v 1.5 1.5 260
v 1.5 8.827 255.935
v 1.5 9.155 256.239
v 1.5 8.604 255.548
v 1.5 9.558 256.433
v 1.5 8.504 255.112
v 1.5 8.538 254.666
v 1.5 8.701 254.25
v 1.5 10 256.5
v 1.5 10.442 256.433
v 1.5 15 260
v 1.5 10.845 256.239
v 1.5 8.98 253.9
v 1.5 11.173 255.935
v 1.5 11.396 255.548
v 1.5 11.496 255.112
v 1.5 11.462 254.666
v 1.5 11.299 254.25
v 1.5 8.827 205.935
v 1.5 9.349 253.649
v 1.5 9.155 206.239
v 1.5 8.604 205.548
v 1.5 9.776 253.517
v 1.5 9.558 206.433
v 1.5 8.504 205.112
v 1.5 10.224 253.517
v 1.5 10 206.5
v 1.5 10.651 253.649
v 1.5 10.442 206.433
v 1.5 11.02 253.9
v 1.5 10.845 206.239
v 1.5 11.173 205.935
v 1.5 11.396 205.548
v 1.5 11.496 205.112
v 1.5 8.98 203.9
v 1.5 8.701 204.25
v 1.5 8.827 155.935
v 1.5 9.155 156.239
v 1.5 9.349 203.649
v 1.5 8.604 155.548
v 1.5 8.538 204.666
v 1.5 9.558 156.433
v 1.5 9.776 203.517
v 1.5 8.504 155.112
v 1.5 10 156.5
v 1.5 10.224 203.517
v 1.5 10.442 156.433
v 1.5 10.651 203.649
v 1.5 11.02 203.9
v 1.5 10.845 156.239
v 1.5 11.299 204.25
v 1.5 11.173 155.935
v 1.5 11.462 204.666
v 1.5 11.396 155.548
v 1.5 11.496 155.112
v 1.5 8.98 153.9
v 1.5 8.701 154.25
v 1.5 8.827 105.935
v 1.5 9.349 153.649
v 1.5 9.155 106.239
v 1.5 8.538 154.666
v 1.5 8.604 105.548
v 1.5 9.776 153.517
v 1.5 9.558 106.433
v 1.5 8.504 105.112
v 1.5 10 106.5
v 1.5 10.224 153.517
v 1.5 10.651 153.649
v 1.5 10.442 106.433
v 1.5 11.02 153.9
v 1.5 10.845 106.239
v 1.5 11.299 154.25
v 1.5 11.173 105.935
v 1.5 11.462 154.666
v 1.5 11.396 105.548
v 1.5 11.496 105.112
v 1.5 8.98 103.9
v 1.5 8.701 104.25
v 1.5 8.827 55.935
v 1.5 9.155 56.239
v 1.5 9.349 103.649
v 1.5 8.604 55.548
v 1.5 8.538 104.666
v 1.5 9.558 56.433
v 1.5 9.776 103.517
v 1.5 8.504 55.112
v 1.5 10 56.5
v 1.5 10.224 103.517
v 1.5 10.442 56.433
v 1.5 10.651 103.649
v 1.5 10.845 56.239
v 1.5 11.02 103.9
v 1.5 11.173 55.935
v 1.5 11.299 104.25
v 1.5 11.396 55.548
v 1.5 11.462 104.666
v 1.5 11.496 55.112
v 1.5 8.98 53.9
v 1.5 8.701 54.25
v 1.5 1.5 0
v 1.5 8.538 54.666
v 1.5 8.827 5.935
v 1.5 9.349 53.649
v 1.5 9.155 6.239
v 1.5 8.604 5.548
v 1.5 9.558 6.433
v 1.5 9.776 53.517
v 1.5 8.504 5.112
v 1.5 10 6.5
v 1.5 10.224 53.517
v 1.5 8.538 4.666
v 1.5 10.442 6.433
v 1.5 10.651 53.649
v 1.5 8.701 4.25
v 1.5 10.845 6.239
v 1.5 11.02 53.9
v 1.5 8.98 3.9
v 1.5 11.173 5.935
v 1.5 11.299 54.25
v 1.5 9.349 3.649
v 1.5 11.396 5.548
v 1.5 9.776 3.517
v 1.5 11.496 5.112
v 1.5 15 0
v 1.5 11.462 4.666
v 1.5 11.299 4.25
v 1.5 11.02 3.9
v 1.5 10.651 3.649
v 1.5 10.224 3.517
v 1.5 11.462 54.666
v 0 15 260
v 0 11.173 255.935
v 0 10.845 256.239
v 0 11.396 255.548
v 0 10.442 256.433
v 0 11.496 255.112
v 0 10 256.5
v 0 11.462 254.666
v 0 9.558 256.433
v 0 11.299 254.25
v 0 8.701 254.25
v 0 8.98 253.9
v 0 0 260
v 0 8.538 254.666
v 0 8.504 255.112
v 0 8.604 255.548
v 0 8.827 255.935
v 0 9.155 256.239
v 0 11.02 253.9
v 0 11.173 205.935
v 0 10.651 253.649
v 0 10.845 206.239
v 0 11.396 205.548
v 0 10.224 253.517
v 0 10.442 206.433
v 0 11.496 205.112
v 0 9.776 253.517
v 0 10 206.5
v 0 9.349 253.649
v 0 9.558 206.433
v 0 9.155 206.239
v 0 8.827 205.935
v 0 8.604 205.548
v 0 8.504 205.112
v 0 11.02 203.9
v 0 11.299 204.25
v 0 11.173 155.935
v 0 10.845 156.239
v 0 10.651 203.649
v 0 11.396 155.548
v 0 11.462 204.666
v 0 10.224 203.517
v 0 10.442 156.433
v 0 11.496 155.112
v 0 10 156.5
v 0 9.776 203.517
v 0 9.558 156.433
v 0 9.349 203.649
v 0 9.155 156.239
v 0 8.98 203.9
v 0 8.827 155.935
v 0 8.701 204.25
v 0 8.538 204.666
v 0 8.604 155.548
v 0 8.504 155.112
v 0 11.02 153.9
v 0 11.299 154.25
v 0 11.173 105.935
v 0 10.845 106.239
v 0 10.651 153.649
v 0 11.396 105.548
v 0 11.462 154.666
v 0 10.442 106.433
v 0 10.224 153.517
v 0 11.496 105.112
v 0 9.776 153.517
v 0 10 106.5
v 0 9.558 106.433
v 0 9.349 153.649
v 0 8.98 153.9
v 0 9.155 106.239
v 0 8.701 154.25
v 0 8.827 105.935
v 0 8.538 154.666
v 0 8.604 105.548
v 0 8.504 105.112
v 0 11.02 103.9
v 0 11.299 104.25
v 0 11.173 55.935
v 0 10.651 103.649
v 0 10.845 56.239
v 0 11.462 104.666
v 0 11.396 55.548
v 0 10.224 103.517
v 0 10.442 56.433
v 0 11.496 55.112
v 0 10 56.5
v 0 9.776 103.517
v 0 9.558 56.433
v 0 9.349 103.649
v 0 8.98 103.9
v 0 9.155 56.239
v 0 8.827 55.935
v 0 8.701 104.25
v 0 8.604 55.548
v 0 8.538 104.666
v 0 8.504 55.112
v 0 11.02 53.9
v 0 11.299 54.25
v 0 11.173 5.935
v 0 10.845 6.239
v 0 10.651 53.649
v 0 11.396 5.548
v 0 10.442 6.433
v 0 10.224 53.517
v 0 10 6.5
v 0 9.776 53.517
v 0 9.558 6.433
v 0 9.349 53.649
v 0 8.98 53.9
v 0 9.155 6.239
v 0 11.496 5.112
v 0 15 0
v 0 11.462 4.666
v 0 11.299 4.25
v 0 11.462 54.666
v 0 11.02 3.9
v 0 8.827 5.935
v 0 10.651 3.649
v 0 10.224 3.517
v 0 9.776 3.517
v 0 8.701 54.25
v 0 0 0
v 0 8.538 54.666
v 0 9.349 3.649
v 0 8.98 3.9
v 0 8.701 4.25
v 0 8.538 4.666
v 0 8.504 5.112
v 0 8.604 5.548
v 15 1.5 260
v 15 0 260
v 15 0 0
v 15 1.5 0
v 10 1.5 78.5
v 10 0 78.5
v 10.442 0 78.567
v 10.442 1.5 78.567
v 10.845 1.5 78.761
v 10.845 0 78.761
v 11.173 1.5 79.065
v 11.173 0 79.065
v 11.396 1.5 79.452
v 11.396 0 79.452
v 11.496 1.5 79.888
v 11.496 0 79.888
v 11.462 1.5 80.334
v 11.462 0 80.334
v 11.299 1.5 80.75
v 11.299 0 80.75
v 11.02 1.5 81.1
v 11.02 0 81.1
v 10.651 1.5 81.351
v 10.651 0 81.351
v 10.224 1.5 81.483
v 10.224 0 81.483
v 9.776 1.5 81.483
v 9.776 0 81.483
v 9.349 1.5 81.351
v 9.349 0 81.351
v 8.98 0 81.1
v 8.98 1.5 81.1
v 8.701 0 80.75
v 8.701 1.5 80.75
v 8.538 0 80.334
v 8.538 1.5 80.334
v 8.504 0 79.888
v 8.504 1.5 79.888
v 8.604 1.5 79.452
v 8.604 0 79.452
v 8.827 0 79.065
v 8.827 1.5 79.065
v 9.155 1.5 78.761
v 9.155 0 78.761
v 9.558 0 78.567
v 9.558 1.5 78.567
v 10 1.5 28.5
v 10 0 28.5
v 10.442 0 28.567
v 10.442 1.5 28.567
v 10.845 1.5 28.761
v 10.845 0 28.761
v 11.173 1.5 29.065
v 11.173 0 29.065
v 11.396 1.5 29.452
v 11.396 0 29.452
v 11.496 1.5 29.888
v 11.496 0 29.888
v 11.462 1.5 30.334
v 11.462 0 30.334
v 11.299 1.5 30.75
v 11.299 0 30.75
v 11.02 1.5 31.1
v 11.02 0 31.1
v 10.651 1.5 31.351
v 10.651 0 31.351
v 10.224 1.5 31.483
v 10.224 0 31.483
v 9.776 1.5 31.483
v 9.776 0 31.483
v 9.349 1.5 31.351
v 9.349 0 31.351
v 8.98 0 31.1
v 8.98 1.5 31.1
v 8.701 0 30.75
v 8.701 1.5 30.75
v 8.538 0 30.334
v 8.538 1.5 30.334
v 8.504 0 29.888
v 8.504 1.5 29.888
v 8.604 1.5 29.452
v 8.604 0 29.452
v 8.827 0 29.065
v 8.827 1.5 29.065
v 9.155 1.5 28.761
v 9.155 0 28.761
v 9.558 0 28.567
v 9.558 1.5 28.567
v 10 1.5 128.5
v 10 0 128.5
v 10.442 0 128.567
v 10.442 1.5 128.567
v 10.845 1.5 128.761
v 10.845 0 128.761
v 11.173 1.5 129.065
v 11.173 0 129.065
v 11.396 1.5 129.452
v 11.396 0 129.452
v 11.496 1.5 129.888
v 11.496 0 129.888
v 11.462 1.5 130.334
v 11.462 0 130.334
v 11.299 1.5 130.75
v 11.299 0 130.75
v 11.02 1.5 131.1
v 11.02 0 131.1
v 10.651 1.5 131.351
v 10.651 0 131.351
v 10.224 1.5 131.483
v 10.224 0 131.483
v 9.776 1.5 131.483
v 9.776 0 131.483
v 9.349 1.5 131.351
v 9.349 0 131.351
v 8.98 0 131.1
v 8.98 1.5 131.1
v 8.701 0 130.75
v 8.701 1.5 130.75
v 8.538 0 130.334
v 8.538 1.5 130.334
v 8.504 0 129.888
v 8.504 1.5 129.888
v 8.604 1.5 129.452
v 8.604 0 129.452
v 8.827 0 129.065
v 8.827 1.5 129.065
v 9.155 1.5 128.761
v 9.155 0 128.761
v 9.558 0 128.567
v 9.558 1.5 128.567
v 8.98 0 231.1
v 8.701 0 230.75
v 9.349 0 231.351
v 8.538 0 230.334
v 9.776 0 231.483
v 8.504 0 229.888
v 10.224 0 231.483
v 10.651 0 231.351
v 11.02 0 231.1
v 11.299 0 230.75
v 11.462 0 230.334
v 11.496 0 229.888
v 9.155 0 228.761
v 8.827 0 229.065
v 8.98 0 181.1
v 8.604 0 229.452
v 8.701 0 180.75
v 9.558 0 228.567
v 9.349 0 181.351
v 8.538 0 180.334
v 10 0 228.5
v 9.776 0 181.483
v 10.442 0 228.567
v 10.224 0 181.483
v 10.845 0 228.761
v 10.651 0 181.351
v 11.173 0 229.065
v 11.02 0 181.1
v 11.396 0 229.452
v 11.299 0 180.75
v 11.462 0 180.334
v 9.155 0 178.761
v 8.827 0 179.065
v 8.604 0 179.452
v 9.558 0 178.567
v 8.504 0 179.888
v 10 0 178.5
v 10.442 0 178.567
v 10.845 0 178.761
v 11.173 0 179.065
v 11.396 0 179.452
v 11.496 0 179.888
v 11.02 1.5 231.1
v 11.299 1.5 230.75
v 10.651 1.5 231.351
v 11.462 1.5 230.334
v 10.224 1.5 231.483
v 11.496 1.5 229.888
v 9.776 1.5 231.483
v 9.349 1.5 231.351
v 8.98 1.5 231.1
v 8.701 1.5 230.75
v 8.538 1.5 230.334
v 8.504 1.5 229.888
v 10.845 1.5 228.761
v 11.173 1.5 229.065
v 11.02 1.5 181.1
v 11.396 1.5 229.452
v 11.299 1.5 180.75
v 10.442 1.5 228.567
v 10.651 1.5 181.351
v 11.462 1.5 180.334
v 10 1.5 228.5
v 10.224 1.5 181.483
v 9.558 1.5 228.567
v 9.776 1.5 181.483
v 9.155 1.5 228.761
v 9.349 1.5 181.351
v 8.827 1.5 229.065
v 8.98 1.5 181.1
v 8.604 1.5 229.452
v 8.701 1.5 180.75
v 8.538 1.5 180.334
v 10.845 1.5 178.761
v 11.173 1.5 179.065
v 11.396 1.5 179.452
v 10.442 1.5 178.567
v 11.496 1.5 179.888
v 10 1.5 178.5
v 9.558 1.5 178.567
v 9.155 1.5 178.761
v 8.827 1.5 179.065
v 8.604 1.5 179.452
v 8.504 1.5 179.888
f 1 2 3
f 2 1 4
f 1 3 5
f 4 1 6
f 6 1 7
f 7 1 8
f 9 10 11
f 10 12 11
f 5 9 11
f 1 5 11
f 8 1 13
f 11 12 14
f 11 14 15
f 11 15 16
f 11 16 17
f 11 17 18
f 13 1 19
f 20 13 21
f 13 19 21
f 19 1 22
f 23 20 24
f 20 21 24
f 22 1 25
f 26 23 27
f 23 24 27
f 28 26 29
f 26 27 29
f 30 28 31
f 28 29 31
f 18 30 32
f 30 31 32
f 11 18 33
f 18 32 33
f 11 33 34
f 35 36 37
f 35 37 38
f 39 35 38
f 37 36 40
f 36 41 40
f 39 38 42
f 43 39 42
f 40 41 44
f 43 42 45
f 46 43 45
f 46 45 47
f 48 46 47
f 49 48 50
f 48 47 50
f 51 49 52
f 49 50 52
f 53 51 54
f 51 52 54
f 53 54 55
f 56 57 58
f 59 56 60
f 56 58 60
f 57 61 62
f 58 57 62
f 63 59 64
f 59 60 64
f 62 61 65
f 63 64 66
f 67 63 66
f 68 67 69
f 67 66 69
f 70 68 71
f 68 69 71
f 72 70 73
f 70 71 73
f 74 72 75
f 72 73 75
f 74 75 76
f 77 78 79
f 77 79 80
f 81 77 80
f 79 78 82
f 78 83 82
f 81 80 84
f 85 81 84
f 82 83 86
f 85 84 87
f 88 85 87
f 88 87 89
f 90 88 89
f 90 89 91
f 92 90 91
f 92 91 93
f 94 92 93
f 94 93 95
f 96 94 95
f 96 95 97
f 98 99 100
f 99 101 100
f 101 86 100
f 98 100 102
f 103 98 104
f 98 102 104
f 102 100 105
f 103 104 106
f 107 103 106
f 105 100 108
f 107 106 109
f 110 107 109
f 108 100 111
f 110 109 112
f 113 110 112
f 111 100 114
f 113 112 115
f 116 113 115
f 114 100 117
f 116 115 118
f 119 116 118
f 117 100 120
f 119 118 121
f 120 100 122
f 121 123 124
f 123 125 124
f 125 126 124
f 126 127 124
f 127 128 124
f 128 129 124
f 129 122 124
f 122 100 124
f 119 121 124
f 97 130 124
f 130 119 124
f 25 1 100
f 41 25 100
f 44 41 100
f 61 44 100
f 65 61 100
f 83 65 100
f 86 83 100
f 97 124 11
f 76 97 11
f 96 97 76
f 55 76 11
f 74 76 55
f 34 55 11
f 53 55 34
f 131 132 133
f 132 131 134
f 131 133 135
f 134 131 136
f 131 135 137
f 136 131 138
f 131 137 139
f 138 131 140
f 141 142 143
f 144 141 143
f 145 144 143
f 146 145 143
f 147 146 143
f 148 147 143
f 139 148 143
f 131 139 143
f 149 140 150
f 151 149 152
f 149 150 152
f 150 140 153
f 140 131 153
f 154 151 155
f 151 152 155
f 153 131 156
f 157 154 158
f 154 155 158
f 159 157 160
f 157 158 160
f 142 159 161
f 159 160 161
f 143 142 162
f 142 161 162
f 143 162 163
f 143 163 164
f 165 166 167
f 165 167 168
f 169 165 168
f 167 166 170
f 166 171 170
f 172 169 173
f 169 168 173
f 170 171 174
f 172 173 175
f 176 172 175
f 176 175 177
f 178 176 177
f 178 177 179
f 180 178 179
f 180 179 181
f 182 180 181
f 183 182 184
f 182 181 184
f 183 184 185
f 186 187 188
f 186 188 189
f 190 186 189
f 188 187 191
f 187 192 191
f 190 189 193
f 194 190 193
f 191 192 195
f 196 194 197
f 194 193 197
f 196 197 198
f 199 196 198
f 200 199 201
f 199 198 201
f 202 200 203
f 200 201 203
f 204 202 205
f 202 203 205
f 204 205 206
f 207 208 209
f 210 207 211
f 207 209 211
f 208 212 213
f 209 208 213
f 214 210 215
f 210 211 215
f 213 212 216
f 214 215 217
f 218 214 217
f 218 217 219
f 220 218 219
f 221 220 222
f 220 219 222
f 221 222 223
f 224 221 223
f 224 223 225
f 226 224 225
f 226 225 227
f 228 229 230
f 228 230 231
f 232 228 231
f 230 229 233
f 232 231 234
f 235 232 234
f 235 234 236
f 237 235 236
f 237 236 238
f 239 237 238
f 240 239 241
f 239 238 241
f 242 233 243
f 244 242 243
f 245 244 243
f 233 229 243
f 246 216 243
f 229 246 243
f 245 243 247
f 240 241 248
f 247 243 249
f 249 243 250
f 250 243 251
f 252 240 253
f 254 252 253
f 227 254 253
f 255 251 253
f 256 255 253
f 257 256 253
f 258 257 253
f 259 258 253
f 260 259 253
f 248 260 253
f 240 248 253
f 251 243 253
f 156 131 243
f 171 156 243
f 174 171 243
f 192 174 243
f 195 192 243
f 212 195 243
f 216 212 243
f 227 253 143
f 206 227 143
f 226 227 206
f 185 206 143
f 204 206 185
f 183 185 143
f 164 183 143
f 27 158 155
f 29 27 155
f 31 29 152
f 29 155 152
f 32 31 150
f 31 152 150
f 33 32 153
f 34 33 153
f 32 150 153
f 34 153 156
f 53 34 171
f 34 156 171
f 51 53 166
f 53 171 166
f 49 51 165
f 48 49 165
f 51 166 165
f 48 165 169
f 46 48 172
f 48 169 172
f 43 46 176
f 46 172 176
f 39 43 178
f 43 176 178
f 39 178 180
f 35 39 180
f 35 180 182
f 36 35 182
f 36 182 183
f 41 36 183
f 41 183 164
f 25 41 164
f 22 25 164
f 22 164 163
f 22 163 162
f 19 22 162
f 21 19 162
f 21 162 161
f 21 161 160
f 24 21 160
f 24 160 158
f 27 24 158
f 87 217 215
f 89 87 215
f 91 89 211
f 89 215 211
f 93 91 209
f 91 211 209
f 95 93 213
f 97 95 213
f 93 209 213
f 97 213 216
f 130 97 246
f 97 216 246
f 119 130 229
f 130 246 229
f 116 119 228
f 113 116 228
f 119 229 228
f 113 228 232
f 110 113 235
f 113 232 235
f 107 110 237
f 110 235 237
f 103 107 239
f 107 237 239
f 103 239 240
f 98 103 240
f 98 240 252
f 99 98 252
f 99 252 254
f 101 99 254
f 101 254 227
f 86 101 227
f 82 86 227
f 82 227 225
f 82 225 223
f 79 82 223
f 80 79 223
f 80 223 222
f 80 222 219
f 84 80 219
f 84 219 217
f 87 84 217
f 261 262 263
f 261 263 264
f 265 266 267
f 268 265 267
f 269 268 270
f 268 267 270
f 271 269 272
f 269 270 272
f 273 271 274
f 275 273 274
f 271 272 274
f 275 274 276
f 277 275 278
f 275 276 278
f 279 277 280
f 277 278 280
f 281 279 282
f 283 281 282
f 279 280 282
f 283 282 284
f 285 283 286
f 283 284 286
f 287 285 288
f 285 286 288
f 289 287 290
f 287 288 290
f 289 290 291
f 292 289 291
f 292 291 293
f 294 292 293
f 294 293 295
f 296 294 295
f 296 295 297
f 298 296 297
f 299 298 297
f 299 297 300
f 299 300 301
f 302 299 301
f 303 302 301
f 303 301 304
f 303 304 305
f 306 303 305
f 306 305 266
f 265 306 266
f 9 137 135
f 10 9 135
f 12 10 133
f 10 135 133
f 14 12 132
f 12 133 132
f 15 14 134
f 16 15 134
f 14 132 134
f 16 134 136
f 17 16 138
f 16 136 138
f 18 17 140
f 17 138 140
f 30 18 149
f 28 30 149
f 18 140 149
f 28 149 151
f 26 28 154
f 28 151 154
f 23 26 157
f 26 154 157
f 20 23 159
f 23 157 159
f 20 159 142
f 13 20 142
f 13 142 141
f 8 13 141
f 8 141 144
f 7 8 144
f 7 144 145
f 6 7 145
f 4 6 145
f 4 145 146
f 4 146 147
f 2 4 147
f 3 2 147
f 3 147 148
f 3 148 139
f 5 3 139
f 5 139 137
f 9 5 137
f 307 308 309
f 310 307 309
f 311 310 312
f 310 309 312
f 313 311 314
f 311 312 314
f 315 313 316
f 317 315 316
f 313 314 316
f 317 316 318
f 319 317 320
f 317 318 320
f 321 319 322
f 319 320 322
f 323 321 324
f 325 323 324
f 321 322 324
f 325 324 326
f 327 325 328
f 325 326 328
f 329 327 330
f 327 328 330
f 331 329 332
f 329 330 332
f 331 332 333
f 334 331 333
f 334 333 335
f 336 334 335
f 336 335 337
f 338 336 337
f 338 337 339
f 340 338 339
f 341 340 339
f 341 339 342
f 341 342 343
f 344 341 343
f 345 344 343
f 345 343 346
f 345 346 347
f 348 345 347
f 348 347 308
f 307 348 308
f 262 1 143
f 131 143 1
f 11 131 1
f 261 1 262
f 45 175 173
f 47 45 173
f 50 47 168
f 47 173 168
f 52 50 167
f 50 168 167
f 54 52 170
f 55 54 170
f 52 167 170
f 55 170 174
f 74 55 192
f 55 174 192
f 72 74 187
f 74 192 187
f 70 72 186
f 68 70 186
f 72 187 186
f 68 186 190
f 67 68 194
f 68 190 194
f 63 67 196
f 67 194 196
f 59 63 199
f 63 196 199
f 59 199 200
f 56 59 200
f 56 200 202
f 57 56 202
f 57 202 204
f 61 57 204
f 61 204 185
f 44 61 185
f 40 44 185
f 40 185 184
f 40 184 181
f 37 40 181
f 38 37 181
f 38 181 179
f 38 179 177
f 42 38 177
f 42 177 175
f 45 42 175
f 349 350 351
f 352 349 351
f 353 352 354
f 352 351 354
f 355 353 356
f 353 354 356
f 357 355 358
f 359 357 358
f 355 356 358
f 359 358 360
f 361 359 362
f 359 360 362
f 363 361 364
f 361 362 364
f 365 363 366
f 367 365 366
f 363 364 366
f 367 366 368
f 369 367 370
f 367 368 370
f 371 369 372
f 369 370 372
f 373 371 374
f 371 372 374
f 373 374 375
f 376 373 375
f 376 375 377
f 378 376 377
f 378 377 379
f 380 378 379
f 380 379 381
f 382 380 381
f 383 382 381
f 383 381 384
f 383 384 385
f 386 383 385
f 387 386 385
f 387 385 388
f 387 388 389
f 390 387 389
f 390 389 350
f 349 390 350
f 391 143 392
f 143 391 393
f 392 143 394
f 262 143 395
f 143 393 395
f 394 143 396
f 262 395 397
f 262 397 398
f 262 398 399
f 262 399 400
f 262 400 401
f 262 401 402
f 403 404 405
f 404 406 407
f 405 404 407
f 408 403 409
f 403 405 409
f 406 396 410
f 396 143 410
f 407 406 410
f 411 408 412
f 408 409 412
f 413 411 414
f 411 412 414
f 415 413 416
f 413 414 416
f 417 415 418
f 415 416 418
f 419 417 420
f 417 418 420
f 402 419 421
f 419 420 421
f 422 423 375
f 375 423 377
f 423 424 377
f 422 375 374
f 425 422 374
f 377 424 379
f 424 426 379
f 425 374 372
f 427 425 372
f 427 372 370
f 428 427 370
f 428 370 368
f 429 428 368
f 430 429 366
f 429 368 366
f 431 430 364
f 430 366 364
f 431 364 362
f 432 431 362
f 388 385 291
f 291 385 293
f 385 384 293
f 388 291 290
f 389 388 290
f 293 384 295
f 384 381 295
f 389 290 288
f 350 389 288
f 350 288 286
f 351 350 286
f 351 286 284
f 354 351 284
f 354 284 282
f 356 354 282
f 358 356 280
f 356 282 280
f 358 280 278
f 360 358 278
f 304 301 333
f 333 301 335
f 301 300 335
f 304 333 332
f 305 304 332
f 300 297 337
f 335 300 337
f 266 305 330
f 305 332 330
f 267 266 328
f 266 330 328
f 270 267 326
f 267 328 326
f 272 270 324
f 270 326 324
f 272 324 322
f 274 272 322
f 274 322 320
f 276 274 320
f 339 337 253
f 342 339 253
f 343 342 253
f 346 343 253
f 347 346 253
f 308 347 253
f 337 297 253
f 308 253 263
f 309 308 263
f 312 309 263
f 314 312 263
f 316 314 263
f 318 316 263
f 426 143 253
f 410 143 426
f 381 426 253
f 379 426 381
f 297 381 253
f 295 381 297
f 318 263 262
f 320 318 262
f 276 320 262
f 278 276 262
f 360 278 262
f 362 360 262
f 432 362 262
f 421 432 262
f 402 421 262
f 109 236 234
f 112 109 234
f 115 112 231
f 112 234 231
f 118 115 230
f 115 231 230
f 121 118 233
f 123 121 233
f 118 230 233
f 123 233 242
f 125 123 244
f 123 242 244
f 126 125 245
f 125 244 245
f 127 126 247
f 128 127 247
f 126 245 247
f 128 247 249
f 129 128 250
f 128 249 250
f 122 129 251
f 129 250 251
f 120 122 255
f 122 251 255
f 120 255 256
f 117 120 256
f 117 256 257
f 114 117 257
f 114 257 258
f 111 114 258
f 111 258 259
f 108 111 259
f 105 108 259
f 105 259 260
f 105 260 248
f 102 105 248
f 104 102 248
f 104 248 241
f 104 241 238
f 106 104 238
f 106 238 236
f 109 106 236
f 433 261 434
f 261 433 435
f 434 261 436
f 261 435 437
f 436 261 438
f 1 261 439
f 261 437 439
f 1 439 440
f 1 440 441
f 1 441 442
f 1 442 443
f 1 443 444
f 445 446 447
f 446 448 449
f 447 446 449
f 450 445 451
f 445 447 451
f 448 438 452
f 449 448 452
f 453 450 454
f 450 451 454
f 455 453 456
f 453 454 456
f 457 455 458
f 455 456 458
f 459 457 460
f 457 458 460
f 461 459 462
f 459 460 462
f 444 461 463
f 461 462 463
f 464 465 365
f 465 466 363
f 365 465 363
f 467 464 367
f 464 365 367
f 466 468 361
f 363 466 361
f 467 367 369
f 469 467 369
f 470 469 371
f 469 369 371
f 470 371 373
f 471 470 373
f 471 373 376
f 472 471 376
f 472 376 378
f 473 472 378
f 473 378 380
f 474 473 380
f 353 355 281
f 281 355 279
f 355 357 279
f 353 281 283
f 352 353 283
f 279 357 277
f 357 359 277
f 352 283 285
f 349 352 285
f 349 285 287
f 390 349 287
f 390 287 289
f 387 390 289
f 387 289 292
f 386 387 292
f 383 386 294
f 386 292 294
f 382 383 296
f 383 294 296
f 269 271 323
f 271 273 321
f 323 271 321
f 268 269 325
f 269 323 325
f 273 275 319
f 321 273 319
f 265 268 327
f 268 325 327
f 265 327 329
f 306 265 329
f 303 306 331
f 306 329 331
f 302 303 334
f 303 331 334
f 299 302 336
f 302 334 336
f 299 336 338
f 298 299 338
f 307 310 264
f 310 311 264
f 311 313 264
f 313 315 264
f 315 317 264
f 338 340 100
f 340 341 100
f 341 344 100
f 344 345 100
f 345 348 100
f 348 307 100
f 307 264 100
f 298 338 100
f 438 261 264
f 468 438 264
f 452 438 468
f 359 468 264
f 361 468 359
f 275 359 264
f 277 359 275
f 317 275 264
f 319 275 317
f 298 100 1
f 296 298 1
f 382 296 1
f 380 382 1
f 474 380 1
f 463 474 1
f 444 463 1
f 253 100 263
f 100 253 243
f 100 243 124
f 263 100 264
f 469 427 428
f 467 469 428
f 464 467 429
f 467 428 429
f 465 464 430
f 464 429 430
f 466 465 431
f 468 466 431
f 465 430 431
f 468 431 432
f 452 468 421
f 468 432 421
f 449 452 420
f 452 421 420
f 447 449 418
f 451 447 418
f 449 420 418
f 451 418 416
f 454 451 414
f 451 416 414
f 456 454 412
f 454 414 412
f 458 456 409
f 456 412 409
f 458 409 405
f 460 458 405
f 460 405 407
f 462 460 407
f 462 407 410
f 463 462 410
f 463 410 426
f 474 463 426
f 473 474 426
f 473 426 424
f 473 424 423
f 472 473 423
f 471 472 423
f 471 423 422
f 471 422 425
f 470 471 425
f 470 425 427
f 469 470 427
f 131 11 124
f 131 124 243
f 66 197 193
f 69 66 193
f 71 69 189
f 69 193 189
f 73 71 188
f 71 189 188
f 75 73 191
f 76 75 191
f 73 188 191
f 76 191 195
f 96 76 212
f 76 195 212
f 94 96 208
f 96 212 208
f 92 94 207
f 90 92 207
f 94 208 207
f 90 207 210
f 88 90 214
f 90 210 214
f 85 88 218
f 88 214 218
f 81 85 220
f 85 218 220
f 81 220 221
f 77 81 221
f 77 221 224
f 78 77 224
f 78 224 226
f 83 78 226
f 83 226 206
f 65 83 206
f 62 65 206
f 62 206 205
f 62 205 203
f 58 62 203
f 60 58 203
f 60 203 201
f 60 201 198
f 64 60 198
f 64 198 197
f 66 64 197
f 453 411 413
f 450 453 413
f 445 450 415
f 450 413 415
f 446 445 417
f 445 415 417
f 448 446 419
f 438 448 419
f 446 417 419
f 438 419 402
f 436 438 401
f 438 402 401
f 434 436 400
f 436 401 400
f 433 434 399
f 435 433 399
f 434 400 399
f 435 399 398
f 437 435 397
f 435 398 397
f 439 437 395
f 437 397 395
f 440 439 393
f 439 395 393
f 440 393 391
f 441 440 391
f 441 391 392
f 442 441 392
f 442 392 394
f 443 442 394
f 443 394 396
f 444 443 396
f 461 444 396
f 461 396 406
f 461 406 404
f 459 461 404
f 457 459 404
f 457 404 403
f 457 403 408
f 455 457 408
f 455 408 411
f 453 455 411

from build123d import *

# Parameters (mm, degrees)
EXTRUSION1_DEPTH           = 260
ESQUISSE2_R                = 1.5
EXTRUSION2_DEPTH           = 261.863949215
R_P_TITION_LIN_AIRE1_COUNT = 6
R_P_TITION_LIN_AIRE1_PITCH = 50
ESQUISSE3_R                = 1.5
EXTRUSION3_DEPTH           = 261.863949215
R_P_TITION_LIN_AIRE2_COUNT = 5
R_P_TITION_LIN_AIRE2_PITCH = 50


with BuildPart() as part:
    # Esquisse1 → Extrusion1 (new body)
    with BuildSketch(Plane.XY):
        Polygon((0, 0), (1.5, 0), (15, 0), (15, 1.5), (1.5, 1.5), (1.5, 15), (0, 15), align=None)
    extrude(amount=EXTRUSION1_DEPTH)

    # Esquisse2 → Extrusion2 (cut, through all)
    with BuildSketch(Plane.ZY):
        with Locations((5, 10)):
            Circle(ESQUISSE2_R)
    extrusion2 = extrude(amount=-EXTRUSION2_DEPTH, mode=Mode.SUBTRACT)

    # Répétition linéaire1: Extrusion2 ×6
    with Locations(*[(0, 0, i * R_P_TITION_LIN_AIRE1_PITCH) for i in range(1, R_P_TITION_LIN_AIRE1_COUNT)]):
        add(extrusion2, mode=Mode.SUBTRACT)

    # Esquisse3 → Extrusion3 (cut, through all)
    with BuildSketch(Plane.XZ):
        with Locations(Location((10, 30, 0), (0, 0, 270))):
            Circle(ESQUISSE3_R)
    extrusion3 = extrude(amount=-EXTRUSION3_DEPTH, mode=Mode.SUBTRACT)

    # Répétition linéaire2: Extrusion3 ×5
    with Locations(*[(0, 0, i * R_P_TITION_LIN_AIRE2_PITCH) for i in range(1, R_P_TITION_LIN_AIRE2_COUNT)]):
        add(extrusion3, mode=Mode.SUBTRACT)


solid = part.part
